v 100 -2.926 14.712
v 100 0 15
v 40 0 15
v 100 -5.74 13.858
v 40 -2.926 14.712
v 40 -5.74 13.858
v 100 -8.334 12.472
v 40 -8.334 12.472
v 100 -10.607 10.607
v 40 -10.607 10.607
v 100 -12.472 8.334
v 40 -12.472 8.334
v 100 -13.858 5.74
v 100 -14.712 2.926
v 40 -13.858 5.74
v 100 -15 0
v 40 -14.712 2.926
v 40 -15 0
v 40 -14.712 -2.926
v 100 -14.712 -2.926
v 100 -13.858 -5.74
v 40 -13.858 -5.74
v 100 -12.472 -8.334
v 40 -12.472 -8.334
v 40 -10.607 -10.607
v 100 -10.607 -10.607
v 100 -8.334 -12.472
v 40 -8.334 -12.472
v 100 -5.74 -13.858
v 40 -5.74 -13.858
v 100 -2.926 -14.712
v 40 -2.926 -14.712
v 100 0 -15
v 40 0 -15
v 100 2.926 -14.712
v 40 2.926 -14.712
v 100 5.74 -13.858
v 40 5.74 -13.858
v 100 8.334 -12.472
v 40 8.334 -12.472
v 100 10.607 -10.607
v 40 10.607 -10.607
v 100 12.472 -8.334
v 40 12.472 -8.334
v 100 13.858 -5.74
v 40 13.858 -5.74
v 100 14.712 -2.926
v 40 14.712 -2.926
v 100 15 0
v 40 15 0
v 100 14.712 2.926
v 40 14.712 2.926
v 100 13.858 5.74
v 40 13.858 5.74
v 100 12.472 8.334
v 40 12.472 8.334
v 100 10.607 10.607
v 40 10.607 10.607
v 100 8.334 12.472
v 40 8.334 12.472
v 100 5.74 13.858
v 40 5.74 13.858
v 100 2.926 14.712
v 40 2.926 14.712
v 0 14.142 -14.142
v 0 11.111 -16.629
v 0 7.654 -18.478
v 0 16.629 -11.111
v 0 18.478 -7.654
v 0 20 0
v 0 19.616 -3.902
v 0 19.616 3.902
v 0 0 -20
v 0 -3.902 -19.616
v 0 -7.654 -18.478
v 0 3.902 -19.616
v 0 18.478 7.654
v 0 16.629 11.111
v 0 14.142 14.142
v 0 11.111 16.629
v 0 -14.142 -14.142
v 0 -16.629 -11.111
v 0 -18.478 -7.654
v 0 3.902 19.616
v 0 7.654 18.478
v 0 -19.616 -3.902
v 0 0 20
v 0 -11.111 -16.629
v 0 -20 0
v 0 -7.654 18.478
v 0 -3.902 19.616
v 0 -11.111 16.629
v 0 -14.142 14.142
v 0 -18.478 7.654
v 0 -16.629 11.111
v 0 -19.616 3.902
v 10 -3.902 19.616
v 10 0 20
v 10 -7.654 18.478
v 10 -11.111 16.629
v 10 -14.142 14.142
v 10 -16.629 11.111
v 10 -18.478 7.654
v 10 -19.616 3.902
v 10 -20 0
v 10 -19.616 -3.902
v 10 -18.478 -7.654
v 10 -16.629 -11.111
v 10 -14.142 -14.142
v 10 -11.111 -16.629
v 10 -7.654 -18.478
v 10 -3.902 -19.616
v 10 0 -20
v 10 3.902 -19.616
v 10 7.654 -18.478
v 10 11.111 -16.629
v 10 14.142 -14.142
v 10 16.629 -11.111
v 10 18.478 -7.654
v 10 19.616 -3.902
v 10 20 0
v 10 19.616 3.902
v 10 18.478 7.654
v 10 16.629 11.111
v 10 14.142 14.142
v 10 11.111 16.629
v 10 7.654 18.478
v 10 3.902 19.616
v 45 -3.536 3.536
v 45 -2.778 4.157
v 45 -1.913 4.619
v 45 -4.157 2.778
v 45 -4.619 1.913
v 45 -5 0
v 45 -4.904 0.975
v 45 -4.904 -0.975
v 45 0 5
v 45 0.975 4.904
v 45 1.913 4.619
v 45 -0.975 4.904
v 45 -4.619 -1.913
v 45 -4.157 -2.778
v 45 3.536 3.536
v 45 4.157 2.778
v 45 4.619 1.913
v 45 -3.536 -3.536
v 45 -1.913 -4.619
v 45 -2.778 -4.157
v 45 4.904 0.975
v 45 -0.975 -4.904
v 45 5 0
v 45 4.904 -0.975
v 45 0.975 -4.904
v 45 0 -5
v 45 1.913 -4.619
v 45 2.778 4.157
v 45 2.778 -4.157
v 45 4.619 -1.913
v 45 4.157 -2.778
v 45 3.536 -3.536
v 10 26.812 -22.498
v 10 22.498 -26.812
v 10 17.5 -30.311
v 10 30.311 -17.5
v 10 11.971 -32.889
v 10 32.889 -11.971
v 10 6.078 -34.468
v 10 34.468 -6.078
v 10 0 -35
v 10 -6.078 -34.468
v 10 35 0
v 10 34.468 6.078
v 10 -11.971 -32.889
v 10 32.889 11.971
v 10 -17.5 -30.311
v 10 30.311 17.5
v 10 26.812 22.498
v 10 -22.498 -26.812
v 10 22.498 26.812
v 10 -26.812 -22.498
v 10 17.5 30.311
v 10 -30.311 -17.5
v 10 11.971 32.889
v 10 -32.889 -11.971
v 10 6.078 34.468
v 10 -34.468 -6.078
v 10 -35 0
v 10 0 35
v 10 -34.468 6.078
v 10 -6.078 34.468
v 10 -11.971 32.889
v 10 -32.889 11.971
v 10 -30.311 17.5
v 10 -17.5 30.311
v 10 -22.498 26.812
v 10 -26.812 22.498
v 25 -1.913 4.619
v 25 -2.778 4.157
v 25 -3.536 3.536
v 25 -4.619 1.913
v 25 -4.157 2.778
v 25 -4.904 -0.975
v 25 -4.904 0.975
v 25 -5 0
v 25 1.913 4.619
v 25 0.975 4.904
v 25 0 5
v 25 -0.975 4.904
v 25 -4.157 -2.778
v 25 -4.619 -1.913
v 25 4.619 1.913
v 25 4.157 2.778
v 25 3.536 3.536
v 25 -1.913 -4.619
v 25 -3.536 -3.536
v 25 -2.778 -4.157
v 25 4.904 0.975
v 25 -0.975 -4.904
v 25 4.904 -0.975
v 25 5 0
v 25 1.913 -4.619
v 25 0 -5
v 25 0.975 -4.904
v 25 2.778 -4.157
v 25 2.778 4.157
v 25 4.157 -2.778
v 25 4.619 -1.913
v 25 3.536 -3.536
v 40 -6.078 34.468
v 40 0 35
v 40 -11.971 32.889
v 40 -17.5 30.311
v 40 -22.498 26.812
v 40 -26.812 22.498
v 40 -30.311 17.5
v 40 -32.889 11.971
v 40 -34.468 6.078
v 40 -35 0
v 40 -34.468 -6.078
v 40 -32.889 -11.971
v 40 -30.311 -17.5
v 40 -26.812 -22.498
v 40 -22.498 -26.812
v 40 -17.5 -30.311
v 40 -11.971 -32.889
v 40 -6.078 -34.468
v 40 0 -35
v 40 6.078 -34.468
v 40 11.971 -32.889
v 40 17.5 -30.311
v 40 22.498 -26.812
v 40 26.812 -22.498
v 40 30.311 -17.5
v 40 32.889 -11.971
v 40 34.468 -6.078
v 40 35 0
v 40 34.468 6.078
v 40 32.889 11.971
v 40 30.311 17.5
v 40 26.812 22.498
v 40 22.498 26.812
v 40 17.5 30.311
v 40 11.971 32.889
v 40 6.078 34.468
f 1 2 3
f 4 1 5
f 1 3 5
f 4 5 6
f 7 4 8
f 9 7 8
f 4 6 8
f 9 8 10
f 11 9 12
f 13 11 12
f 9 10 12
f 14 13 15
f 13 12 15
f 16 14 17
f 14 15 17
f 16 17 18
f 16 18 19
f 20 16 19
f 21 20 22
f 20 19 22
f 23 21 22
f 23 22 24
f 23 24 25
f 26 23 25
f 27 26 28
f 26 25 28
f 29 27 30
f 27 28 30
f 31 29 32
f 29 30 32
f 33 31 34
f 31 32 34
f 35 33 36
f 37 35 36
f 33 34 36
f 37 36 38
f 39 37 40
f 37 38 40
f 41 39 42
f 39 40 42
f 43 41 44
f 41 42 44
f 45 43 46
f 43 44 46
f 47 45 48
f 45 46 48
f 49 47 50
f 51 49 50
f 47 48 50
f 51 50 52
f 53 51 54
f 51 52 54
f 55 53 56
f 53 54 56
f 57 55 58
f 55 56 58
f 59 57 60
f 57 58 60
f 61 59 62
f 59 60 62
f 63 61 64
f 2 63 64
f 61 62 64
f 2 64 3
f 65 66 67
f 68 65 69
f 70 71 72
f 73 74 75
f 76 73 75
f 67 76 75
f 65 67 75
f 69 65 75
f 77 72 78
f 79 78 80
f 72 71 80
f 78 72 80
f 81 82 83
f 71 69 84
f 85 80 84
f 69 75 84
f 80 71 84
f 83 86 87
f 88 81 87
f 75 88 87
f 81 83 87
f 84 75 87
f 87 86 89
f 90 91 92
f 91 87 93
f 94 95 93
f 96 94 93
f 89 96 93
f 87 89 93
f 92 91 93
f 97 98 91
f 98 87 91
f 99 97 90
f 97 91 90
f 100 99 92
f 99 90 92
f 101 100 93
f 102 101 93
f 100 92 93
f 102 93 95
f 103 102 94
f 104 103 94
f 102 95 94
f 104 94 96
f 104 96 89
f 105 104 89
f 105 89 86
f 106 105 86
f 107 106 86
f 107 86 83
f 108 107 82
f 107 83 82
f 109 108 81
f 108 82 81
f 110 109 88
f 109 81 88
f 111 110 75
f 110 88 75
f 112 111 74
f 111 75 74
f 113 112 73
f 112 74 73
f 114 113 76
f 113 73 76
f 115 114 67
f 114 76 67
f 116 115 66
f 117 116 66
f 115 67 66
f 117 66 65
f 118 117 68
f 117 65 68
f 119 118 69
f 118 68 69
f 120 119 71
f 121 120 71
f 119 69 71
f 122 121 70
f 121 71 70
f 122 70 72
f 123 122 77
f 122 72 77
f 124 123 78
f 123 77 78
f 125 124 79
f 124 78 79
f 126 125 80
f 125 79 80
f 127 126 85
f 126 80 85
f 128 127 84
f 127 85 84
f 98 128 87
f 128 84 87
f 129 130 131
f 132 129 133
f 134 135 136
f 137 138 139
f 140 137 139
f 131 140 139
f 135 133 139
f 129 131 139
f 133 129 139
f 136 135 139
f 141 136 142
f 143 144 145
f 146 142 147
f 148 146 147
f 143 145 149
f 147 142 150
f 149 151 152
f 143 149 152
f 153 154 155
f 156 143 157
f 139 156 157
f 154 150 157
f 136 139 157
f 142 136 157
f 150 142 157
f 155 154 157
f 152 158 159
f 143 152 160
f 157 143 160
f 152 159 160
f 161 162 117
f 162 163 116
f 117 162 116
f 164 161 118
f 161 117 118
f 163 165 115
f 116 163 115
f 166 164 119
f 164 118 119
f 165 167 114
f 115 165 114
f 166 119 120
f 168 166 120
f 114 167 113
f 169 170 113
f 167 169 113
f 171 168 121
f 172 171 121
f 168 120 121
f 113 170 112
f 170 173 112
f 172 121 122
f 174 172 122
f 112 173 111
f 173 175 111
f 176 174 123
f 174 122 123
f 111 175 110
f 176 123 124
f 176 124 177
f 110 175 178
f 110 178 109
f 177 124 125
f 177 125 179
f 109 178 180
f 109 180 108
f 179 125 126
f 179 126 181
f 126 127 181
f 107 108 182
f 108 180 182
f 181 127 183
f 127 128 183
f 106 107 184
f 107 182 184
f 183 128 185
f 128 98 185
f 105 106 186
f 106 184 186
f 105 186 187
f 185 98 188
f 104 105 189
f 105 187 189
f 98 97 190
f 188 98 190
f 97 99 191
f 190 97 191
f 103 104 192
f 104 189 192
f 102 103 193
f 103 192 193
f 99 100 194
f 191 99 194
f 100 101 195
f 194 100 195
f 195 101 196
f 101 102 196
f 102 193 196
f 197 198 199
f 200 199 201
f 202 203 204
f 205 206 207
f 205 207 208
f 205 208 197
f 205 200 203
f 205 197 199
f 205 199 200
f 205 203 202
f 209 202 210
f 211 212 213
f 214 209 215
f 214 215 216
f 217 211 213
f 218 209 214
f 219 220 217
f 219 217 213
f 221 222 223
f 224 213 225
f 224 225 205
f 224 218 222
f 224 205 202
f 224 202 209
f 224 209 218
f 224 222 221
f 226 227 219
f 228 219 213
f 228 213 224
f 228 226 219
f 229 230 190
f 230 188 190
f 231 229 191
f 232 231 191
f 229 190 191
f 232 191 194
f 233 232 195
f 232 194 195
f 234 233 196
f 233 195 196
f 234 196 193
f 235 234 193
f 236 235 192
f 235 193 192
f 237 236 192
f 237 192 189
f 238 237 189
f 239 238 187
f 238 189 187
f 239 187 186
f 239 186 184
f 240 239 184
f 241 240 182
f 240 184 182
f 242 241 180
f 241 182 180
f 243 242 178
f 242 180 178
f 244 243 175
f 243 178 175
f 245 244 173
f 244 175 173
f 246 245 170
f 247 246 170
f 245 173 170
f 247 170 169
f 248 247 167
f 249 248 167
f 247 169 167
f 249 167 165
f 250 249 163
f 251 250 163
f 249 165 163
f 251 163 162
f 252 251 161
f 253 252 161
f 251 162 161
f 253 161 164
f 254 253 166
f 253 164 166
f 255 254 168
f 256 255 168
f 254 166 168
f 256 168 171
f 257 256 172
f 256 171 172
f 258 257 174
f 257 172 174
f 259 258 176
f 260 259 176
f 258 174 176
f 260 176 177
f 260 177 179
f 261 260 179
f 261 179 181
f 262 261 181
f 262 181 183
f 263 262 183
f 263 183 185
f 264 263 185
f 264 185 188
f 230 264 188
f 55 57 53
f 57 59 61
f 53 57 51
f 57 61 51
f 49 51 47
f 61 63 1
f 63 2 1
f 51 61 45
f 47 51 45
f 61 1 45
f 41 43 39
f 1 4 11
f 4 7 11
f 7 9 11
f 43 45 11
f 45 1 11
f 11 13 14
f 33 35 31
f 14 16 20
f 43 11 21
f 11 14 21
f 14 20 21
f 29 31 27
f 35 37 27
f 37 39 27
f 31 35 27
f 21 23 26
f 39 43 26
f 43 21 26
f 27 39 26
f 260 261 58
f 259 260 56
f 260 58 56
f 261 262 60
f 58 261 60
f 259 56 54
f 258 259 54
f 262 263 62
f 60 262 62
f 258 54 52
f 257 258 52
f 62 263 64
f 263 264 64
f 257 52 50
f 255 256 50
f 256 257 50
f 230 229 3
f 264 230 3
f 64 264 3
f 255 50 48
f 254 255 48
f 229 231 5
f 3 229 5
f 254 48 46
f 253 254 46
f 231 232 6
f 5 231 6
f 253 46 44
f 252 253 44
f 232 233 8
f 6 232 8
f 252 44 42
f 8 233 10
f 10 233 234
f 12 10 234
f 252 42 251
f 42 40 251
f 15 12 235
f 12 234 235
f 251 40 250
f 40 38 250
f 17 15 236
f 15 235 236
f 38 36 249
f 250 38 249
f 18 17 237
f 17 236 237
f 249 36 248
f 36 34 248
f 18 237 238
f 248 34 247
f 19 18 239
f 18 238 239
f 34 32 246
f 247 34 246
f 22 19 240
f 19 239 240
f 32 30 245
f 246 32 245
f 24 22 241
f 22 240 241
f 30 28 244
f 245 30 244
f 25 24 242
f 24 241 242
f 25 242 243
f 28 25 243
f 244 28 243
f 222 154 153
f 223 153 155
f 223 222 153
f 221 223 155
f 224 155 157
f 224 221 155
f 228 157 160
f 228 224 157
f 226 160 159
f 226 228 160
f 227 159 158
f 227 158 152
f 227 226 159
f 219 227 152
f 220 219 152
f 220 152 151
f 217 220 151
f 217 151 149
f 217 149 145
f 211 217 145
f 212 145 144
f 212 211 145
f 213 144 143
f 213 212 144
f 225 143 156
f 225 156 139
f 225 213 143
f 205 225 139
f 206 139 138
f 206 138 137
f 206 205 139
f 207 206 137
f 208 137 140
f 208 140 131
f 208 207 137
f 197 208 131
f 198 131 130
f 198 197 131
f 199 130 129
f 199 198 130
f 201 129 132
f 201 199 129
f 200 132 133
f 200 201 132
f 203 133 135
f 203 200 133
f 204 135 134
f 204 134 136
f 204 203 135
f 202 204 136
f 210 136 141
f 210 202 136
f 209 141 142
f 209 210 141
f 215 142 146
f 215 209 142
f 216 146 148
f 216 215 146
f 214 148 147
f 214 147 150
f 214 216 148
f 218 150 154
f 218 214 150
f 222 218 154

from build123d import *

# Parameters (mm, degrees)
SKETCH_2_R          = 5
CUT_EXTRUDE_1_DEPTH = 20


with BuildPart() as part:
    # Эскиз1 → Повернуть1 (revolve)
    with BuildSketch(Plane.XY, mode=Mode.PRIVATE) as revolve_1_sk:
        Polygon((0, 0), (100, 0), (100, 15), (40, 15), (40, 35), (10, 35), (10, 20), (0, 20), align=None)
    revolve(revolve_1_sk.sketch.rotate(Axis((0, 0, 0), (1, 0, 0)), 90), axis=Axis((0, 0, 0), (1, 0, 0)))

    # Эскиз2 → Вырез-Вытянуть1 (cut)
    with BuildSketch(Plane(origin=(25, 0, 0), x_dir=(0, 0, -1), z_dir=(1, 0, 0))):
        Circle(SKETCH_2_R)
    extrude(amount=CUT_EXTRUDE_1_DEPTH, mode=Mode.SUBTRACT)


solid = part.part
